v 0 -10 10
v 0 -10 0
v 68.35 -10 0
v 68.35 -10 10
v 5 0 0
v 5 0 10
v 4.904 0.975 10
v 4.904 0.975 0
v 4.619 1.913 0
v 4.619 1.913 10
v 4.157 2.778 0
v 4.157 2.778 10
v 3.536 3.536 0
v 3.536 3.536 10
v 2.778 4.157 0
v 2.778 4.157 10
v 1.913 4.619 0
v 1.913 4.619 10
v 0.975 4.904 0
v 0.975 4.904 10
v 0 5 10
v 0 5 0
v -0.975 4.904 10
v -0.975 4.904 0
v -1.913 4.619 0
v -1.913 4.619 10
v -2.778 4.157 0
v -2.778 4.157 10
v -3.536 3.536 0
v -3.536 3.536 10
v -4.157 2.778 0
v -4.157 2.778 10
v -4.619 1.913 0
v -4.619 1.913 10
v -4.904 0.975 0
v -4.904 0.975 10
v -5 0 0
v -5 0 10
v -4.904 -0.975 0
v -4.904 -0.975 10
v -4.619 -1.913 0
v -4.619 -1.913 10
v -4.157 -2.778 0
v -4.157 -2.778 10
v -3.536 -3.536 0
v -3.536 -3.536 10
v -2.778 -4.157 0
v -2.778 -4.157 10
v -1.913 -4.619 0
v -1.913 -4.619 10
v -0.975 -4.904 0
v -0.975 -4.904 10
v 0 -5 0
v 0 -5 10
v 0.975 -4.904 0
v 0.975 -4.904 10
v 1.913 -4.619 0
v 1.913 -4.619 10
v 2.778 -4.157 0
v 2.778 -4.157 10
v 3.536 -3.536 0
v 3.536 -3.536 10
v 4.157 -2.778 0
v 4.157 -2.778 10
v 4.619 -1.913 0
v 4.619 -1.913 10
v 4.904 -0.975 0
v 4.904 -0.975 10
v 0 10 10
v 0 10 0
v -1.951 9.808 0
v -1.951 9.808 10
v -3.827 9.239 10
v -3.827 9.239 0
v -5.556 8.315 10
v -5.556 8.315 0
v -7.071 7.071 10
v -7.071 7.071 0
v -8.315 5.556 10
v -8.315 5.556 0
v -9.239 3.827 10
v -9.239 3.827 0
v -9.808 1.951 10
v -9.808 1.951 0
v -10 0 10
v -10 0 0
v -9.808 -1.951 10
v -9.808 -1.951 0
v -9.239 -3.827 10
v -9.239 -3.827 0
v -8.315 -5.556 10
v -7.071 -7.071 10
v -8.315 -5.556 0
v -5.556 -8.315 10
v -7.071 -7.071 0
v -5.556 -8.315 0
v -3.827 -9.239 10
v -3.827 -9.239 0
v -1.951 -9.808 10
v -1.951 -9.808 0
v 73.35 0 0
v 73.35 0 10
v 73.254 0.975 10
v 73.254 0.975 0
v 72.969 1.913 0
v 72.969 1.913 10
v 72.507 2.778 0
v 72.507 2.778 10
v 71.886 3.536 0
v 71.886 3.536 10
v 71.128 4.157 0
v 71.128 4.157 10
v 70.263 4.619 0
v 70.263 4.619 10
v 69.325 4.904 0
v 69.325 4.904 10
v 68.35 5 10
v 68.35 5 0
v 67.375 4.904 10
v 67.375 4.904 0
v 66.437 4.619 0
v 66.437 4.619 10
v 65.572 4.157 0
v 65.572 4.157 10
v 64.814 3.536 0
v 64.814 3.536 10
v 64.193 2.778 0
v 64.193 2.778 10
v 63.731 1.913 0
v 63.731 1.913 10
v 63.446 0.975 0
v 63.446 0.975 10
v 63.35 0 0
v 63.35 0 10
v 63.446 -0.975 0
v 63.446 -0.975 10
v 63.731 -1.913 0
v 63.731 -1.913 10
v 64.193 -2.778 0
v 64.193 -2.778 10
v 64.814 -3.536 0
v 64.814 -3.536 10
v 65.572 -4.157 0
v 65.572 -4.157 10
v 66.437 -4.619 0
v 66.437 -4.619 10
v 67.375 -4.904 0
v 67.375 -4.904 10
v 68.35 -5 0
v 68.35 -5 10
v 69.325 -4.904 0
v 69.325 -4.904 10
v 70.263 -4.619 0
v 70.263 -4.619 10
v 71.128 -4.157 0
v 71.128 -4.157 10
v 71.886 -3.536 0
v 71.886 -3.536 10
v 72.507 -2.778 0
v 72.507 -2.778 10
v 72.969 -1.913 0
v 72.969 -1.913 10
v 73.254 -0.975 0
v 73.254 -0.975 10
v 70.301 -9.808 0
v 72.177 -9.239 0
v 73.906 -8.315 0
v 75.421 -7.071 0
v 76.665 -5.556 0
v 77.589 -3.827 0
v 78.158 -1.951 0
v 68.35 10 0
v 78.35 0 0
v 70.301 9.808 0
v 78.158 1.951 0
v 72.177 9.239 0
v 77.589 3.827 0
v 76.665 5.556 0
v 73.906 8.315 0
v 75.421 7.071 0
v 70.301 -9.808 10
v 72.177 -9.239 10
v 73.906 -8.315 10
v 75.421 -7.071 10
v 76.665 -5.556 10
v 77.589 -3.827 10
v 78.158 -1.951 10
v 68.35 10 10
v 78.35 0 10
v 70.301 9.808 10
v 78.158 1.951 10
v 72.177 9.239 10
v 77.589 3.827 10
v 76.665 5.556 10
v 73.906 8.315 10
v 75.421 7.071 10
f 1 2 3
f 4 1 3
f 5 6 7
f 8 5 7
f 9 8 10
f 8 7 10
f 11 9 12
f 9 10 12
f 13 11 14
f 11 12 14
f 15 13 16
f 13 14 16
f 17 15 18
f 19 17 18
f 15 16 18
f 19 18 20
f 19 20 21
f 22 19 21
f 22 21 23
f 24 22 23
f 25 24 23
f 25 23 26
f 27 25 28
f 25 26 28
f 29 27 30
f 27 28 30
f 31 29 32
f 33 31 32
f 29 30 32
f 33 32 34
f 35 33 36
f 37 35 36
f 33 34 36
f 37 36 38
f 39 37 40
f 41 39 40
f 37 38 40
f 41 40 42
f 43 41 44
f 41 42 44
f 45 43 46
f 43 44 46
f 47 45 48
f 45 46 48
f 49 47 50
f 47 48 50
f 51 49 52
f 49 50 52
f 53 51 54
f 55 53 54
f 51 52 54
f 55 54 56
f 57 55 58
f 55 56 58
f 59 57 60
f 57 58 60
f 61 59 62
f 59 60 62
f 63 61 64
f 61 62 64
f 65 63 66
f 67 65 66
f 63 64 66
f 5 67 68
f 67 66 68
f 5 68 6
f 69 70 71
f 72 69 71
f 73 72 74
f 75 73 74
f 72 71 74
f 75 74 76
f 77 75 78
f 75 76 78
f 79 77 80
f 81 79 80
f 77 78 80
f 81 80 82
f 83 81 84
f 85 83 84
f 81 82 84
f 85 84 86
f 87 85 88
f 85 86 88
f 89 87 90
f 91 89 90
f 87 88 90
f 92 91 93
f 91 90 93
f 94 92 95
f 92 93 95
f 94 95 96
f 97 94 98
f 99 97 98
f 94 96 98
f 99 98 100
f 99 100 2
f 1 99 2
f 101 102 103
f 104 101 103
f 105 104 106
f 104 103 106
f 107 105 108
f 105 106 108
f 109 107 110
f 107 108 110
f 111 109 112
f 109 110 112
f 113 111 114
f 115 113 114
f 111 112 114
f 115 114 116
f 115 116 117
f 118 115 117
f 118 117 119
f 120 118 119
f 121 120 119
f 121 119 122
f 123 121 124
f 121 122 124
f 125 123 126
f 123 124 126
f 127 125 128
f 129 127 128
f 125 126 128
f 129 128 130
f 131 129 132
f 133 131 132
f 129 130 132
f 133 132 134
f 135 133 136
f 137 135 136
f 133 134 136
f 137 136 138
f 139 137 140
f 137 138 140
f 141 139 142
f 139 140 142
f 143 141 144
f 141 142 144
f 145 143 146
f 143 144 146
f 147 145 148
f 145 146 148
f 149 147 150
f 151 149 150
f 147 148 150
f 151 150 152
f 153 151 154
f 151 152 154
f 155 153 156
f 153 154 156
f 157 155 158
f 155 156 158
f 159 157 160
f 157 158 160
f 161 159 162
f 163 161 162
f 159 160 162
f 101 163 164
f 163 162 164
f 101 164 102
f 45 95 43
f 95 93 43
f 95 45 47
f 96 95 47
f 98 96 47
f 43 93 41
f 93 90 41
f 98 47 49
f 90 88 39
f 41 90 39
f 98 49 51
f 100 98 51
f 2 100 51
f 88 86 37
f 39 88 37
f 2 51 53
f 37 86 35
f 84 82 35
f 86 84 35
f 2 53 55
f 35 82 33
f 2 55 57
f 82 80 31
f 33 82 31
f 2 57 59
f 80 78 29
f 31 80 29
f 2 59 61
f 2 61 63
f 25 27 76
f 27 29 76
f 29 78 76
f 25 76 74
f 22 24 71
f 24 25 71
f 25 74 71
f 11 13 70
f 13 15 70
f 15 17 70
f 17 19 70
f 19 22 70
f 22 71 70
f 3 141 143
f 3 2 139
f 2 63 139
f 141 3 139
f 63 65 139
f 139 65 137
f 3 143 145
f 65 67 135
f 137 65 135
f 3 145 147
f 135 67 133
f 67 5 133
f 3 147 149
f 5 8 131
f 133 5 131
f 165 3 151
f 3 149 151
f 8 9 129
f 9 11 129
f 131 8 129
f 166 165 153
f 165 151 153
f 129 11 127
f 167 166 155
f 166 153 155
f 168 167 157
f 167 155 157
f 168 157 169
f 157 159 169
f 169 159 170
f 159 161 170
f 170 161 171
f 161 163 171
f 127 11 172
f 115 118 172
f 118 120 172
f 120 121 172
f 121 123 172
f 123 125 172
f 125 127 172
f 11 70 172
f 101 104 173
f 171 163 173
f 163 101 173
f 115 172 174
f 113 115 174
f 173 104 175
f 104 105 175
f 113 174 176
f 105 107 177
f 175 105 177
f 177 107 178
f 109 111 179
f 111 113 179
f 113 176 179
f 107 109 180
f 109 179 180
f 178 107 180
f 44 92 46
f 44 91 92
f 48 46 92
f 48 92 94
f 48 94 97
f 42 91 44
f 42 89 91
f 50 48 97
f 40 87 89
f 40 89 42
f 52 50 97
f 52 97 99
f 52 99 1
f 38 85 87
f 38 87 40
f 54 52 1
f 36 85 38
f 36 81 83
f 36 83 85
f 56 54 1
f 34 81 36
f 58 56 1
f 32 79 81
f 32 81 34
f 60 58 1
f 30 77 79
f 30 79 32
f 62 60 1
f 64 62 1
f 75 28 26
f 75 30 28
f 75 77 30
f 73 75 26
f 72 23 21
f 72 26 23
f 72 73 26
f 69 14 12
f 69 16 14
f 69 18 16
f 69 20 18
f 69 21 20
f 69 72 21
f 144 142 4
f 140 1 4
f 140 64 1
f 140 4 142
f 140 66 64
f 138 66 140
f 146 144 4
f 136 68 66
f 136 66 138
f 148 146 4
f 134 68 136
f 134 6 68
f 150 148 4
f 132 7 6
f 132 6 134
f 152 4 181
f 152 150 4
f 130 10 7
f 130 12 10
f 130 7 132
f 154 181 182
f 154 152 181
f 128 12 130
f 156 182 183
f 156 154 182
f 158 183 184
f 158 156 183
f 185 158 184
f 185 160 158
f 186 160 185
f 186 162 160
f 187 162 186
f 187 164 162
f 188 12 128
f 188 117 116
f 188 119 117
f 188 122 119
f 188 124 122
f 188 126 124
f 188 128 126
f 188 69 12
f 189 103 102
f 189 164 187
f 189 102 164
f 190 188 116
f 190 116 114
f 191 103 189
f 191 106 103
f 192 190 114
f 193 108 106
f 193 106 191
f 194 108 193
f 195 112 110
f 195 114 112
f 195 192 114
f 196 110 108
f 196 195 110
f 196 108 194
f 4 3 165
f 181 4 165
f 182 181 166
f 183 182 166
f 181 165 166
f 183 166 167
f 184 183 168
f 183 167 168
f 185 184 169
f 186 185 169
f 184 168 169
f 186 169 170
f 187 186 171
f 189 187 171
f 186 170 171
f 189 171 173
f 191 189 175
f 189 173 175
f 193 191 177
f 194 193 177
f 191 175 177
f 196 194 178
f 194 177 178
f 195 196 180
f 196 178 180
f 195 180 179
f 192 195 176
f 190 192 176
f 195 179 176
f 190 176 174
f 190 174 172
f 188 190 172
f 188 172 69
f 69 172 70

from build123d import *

# Parameters (mm, degrees)
EXTRUDE_1_DEPTH     = 10
SKETCH_2_R          = 5
CUT_EXTRUDE_1_DEPTH = 10
SKETCH_3_R          = 5
CUT_EXTRUDE_2_DEPTH = 10


with BuildPart() as part:
    # 草图1 → 凸台-拉伸1 (new body)
    with BuildSketch(Plane.XY):
        with BuildLine():
            Line((0, -10), (68.35, -10))
            ThreePointArc((68.35, -10), (78.35, 0), (68.35, 10))
            Line((68.35, 10), (0, 10))
            ThreePointArc((0, 10), (-10, 0), (0, -10))
        make_face()
    extrude(amount=EXTRUDE_1_DEPTH)

    # 草图2 → 切除-拉伸1 (cut)
    with BuildSketch(Plane.XY.offset(10)):
        Circle(SKETCH_2_R)
    extrude(amount=-CUT_EXTRUDE_1_DEPTH, mode=Mode.SUBTRACT)

    # 草图3 → 切除-拉伸2 (cut)
    with BuildSketch(Plane.XY.offset(10)):
        with Locations((68.35, 0)):
            Circle(SKETCH_3_R)
    extrude(amount=-CUT_EXTRUDE_2_DEPTH, mode=Mode.SUBTRACT)


solid = part.part
